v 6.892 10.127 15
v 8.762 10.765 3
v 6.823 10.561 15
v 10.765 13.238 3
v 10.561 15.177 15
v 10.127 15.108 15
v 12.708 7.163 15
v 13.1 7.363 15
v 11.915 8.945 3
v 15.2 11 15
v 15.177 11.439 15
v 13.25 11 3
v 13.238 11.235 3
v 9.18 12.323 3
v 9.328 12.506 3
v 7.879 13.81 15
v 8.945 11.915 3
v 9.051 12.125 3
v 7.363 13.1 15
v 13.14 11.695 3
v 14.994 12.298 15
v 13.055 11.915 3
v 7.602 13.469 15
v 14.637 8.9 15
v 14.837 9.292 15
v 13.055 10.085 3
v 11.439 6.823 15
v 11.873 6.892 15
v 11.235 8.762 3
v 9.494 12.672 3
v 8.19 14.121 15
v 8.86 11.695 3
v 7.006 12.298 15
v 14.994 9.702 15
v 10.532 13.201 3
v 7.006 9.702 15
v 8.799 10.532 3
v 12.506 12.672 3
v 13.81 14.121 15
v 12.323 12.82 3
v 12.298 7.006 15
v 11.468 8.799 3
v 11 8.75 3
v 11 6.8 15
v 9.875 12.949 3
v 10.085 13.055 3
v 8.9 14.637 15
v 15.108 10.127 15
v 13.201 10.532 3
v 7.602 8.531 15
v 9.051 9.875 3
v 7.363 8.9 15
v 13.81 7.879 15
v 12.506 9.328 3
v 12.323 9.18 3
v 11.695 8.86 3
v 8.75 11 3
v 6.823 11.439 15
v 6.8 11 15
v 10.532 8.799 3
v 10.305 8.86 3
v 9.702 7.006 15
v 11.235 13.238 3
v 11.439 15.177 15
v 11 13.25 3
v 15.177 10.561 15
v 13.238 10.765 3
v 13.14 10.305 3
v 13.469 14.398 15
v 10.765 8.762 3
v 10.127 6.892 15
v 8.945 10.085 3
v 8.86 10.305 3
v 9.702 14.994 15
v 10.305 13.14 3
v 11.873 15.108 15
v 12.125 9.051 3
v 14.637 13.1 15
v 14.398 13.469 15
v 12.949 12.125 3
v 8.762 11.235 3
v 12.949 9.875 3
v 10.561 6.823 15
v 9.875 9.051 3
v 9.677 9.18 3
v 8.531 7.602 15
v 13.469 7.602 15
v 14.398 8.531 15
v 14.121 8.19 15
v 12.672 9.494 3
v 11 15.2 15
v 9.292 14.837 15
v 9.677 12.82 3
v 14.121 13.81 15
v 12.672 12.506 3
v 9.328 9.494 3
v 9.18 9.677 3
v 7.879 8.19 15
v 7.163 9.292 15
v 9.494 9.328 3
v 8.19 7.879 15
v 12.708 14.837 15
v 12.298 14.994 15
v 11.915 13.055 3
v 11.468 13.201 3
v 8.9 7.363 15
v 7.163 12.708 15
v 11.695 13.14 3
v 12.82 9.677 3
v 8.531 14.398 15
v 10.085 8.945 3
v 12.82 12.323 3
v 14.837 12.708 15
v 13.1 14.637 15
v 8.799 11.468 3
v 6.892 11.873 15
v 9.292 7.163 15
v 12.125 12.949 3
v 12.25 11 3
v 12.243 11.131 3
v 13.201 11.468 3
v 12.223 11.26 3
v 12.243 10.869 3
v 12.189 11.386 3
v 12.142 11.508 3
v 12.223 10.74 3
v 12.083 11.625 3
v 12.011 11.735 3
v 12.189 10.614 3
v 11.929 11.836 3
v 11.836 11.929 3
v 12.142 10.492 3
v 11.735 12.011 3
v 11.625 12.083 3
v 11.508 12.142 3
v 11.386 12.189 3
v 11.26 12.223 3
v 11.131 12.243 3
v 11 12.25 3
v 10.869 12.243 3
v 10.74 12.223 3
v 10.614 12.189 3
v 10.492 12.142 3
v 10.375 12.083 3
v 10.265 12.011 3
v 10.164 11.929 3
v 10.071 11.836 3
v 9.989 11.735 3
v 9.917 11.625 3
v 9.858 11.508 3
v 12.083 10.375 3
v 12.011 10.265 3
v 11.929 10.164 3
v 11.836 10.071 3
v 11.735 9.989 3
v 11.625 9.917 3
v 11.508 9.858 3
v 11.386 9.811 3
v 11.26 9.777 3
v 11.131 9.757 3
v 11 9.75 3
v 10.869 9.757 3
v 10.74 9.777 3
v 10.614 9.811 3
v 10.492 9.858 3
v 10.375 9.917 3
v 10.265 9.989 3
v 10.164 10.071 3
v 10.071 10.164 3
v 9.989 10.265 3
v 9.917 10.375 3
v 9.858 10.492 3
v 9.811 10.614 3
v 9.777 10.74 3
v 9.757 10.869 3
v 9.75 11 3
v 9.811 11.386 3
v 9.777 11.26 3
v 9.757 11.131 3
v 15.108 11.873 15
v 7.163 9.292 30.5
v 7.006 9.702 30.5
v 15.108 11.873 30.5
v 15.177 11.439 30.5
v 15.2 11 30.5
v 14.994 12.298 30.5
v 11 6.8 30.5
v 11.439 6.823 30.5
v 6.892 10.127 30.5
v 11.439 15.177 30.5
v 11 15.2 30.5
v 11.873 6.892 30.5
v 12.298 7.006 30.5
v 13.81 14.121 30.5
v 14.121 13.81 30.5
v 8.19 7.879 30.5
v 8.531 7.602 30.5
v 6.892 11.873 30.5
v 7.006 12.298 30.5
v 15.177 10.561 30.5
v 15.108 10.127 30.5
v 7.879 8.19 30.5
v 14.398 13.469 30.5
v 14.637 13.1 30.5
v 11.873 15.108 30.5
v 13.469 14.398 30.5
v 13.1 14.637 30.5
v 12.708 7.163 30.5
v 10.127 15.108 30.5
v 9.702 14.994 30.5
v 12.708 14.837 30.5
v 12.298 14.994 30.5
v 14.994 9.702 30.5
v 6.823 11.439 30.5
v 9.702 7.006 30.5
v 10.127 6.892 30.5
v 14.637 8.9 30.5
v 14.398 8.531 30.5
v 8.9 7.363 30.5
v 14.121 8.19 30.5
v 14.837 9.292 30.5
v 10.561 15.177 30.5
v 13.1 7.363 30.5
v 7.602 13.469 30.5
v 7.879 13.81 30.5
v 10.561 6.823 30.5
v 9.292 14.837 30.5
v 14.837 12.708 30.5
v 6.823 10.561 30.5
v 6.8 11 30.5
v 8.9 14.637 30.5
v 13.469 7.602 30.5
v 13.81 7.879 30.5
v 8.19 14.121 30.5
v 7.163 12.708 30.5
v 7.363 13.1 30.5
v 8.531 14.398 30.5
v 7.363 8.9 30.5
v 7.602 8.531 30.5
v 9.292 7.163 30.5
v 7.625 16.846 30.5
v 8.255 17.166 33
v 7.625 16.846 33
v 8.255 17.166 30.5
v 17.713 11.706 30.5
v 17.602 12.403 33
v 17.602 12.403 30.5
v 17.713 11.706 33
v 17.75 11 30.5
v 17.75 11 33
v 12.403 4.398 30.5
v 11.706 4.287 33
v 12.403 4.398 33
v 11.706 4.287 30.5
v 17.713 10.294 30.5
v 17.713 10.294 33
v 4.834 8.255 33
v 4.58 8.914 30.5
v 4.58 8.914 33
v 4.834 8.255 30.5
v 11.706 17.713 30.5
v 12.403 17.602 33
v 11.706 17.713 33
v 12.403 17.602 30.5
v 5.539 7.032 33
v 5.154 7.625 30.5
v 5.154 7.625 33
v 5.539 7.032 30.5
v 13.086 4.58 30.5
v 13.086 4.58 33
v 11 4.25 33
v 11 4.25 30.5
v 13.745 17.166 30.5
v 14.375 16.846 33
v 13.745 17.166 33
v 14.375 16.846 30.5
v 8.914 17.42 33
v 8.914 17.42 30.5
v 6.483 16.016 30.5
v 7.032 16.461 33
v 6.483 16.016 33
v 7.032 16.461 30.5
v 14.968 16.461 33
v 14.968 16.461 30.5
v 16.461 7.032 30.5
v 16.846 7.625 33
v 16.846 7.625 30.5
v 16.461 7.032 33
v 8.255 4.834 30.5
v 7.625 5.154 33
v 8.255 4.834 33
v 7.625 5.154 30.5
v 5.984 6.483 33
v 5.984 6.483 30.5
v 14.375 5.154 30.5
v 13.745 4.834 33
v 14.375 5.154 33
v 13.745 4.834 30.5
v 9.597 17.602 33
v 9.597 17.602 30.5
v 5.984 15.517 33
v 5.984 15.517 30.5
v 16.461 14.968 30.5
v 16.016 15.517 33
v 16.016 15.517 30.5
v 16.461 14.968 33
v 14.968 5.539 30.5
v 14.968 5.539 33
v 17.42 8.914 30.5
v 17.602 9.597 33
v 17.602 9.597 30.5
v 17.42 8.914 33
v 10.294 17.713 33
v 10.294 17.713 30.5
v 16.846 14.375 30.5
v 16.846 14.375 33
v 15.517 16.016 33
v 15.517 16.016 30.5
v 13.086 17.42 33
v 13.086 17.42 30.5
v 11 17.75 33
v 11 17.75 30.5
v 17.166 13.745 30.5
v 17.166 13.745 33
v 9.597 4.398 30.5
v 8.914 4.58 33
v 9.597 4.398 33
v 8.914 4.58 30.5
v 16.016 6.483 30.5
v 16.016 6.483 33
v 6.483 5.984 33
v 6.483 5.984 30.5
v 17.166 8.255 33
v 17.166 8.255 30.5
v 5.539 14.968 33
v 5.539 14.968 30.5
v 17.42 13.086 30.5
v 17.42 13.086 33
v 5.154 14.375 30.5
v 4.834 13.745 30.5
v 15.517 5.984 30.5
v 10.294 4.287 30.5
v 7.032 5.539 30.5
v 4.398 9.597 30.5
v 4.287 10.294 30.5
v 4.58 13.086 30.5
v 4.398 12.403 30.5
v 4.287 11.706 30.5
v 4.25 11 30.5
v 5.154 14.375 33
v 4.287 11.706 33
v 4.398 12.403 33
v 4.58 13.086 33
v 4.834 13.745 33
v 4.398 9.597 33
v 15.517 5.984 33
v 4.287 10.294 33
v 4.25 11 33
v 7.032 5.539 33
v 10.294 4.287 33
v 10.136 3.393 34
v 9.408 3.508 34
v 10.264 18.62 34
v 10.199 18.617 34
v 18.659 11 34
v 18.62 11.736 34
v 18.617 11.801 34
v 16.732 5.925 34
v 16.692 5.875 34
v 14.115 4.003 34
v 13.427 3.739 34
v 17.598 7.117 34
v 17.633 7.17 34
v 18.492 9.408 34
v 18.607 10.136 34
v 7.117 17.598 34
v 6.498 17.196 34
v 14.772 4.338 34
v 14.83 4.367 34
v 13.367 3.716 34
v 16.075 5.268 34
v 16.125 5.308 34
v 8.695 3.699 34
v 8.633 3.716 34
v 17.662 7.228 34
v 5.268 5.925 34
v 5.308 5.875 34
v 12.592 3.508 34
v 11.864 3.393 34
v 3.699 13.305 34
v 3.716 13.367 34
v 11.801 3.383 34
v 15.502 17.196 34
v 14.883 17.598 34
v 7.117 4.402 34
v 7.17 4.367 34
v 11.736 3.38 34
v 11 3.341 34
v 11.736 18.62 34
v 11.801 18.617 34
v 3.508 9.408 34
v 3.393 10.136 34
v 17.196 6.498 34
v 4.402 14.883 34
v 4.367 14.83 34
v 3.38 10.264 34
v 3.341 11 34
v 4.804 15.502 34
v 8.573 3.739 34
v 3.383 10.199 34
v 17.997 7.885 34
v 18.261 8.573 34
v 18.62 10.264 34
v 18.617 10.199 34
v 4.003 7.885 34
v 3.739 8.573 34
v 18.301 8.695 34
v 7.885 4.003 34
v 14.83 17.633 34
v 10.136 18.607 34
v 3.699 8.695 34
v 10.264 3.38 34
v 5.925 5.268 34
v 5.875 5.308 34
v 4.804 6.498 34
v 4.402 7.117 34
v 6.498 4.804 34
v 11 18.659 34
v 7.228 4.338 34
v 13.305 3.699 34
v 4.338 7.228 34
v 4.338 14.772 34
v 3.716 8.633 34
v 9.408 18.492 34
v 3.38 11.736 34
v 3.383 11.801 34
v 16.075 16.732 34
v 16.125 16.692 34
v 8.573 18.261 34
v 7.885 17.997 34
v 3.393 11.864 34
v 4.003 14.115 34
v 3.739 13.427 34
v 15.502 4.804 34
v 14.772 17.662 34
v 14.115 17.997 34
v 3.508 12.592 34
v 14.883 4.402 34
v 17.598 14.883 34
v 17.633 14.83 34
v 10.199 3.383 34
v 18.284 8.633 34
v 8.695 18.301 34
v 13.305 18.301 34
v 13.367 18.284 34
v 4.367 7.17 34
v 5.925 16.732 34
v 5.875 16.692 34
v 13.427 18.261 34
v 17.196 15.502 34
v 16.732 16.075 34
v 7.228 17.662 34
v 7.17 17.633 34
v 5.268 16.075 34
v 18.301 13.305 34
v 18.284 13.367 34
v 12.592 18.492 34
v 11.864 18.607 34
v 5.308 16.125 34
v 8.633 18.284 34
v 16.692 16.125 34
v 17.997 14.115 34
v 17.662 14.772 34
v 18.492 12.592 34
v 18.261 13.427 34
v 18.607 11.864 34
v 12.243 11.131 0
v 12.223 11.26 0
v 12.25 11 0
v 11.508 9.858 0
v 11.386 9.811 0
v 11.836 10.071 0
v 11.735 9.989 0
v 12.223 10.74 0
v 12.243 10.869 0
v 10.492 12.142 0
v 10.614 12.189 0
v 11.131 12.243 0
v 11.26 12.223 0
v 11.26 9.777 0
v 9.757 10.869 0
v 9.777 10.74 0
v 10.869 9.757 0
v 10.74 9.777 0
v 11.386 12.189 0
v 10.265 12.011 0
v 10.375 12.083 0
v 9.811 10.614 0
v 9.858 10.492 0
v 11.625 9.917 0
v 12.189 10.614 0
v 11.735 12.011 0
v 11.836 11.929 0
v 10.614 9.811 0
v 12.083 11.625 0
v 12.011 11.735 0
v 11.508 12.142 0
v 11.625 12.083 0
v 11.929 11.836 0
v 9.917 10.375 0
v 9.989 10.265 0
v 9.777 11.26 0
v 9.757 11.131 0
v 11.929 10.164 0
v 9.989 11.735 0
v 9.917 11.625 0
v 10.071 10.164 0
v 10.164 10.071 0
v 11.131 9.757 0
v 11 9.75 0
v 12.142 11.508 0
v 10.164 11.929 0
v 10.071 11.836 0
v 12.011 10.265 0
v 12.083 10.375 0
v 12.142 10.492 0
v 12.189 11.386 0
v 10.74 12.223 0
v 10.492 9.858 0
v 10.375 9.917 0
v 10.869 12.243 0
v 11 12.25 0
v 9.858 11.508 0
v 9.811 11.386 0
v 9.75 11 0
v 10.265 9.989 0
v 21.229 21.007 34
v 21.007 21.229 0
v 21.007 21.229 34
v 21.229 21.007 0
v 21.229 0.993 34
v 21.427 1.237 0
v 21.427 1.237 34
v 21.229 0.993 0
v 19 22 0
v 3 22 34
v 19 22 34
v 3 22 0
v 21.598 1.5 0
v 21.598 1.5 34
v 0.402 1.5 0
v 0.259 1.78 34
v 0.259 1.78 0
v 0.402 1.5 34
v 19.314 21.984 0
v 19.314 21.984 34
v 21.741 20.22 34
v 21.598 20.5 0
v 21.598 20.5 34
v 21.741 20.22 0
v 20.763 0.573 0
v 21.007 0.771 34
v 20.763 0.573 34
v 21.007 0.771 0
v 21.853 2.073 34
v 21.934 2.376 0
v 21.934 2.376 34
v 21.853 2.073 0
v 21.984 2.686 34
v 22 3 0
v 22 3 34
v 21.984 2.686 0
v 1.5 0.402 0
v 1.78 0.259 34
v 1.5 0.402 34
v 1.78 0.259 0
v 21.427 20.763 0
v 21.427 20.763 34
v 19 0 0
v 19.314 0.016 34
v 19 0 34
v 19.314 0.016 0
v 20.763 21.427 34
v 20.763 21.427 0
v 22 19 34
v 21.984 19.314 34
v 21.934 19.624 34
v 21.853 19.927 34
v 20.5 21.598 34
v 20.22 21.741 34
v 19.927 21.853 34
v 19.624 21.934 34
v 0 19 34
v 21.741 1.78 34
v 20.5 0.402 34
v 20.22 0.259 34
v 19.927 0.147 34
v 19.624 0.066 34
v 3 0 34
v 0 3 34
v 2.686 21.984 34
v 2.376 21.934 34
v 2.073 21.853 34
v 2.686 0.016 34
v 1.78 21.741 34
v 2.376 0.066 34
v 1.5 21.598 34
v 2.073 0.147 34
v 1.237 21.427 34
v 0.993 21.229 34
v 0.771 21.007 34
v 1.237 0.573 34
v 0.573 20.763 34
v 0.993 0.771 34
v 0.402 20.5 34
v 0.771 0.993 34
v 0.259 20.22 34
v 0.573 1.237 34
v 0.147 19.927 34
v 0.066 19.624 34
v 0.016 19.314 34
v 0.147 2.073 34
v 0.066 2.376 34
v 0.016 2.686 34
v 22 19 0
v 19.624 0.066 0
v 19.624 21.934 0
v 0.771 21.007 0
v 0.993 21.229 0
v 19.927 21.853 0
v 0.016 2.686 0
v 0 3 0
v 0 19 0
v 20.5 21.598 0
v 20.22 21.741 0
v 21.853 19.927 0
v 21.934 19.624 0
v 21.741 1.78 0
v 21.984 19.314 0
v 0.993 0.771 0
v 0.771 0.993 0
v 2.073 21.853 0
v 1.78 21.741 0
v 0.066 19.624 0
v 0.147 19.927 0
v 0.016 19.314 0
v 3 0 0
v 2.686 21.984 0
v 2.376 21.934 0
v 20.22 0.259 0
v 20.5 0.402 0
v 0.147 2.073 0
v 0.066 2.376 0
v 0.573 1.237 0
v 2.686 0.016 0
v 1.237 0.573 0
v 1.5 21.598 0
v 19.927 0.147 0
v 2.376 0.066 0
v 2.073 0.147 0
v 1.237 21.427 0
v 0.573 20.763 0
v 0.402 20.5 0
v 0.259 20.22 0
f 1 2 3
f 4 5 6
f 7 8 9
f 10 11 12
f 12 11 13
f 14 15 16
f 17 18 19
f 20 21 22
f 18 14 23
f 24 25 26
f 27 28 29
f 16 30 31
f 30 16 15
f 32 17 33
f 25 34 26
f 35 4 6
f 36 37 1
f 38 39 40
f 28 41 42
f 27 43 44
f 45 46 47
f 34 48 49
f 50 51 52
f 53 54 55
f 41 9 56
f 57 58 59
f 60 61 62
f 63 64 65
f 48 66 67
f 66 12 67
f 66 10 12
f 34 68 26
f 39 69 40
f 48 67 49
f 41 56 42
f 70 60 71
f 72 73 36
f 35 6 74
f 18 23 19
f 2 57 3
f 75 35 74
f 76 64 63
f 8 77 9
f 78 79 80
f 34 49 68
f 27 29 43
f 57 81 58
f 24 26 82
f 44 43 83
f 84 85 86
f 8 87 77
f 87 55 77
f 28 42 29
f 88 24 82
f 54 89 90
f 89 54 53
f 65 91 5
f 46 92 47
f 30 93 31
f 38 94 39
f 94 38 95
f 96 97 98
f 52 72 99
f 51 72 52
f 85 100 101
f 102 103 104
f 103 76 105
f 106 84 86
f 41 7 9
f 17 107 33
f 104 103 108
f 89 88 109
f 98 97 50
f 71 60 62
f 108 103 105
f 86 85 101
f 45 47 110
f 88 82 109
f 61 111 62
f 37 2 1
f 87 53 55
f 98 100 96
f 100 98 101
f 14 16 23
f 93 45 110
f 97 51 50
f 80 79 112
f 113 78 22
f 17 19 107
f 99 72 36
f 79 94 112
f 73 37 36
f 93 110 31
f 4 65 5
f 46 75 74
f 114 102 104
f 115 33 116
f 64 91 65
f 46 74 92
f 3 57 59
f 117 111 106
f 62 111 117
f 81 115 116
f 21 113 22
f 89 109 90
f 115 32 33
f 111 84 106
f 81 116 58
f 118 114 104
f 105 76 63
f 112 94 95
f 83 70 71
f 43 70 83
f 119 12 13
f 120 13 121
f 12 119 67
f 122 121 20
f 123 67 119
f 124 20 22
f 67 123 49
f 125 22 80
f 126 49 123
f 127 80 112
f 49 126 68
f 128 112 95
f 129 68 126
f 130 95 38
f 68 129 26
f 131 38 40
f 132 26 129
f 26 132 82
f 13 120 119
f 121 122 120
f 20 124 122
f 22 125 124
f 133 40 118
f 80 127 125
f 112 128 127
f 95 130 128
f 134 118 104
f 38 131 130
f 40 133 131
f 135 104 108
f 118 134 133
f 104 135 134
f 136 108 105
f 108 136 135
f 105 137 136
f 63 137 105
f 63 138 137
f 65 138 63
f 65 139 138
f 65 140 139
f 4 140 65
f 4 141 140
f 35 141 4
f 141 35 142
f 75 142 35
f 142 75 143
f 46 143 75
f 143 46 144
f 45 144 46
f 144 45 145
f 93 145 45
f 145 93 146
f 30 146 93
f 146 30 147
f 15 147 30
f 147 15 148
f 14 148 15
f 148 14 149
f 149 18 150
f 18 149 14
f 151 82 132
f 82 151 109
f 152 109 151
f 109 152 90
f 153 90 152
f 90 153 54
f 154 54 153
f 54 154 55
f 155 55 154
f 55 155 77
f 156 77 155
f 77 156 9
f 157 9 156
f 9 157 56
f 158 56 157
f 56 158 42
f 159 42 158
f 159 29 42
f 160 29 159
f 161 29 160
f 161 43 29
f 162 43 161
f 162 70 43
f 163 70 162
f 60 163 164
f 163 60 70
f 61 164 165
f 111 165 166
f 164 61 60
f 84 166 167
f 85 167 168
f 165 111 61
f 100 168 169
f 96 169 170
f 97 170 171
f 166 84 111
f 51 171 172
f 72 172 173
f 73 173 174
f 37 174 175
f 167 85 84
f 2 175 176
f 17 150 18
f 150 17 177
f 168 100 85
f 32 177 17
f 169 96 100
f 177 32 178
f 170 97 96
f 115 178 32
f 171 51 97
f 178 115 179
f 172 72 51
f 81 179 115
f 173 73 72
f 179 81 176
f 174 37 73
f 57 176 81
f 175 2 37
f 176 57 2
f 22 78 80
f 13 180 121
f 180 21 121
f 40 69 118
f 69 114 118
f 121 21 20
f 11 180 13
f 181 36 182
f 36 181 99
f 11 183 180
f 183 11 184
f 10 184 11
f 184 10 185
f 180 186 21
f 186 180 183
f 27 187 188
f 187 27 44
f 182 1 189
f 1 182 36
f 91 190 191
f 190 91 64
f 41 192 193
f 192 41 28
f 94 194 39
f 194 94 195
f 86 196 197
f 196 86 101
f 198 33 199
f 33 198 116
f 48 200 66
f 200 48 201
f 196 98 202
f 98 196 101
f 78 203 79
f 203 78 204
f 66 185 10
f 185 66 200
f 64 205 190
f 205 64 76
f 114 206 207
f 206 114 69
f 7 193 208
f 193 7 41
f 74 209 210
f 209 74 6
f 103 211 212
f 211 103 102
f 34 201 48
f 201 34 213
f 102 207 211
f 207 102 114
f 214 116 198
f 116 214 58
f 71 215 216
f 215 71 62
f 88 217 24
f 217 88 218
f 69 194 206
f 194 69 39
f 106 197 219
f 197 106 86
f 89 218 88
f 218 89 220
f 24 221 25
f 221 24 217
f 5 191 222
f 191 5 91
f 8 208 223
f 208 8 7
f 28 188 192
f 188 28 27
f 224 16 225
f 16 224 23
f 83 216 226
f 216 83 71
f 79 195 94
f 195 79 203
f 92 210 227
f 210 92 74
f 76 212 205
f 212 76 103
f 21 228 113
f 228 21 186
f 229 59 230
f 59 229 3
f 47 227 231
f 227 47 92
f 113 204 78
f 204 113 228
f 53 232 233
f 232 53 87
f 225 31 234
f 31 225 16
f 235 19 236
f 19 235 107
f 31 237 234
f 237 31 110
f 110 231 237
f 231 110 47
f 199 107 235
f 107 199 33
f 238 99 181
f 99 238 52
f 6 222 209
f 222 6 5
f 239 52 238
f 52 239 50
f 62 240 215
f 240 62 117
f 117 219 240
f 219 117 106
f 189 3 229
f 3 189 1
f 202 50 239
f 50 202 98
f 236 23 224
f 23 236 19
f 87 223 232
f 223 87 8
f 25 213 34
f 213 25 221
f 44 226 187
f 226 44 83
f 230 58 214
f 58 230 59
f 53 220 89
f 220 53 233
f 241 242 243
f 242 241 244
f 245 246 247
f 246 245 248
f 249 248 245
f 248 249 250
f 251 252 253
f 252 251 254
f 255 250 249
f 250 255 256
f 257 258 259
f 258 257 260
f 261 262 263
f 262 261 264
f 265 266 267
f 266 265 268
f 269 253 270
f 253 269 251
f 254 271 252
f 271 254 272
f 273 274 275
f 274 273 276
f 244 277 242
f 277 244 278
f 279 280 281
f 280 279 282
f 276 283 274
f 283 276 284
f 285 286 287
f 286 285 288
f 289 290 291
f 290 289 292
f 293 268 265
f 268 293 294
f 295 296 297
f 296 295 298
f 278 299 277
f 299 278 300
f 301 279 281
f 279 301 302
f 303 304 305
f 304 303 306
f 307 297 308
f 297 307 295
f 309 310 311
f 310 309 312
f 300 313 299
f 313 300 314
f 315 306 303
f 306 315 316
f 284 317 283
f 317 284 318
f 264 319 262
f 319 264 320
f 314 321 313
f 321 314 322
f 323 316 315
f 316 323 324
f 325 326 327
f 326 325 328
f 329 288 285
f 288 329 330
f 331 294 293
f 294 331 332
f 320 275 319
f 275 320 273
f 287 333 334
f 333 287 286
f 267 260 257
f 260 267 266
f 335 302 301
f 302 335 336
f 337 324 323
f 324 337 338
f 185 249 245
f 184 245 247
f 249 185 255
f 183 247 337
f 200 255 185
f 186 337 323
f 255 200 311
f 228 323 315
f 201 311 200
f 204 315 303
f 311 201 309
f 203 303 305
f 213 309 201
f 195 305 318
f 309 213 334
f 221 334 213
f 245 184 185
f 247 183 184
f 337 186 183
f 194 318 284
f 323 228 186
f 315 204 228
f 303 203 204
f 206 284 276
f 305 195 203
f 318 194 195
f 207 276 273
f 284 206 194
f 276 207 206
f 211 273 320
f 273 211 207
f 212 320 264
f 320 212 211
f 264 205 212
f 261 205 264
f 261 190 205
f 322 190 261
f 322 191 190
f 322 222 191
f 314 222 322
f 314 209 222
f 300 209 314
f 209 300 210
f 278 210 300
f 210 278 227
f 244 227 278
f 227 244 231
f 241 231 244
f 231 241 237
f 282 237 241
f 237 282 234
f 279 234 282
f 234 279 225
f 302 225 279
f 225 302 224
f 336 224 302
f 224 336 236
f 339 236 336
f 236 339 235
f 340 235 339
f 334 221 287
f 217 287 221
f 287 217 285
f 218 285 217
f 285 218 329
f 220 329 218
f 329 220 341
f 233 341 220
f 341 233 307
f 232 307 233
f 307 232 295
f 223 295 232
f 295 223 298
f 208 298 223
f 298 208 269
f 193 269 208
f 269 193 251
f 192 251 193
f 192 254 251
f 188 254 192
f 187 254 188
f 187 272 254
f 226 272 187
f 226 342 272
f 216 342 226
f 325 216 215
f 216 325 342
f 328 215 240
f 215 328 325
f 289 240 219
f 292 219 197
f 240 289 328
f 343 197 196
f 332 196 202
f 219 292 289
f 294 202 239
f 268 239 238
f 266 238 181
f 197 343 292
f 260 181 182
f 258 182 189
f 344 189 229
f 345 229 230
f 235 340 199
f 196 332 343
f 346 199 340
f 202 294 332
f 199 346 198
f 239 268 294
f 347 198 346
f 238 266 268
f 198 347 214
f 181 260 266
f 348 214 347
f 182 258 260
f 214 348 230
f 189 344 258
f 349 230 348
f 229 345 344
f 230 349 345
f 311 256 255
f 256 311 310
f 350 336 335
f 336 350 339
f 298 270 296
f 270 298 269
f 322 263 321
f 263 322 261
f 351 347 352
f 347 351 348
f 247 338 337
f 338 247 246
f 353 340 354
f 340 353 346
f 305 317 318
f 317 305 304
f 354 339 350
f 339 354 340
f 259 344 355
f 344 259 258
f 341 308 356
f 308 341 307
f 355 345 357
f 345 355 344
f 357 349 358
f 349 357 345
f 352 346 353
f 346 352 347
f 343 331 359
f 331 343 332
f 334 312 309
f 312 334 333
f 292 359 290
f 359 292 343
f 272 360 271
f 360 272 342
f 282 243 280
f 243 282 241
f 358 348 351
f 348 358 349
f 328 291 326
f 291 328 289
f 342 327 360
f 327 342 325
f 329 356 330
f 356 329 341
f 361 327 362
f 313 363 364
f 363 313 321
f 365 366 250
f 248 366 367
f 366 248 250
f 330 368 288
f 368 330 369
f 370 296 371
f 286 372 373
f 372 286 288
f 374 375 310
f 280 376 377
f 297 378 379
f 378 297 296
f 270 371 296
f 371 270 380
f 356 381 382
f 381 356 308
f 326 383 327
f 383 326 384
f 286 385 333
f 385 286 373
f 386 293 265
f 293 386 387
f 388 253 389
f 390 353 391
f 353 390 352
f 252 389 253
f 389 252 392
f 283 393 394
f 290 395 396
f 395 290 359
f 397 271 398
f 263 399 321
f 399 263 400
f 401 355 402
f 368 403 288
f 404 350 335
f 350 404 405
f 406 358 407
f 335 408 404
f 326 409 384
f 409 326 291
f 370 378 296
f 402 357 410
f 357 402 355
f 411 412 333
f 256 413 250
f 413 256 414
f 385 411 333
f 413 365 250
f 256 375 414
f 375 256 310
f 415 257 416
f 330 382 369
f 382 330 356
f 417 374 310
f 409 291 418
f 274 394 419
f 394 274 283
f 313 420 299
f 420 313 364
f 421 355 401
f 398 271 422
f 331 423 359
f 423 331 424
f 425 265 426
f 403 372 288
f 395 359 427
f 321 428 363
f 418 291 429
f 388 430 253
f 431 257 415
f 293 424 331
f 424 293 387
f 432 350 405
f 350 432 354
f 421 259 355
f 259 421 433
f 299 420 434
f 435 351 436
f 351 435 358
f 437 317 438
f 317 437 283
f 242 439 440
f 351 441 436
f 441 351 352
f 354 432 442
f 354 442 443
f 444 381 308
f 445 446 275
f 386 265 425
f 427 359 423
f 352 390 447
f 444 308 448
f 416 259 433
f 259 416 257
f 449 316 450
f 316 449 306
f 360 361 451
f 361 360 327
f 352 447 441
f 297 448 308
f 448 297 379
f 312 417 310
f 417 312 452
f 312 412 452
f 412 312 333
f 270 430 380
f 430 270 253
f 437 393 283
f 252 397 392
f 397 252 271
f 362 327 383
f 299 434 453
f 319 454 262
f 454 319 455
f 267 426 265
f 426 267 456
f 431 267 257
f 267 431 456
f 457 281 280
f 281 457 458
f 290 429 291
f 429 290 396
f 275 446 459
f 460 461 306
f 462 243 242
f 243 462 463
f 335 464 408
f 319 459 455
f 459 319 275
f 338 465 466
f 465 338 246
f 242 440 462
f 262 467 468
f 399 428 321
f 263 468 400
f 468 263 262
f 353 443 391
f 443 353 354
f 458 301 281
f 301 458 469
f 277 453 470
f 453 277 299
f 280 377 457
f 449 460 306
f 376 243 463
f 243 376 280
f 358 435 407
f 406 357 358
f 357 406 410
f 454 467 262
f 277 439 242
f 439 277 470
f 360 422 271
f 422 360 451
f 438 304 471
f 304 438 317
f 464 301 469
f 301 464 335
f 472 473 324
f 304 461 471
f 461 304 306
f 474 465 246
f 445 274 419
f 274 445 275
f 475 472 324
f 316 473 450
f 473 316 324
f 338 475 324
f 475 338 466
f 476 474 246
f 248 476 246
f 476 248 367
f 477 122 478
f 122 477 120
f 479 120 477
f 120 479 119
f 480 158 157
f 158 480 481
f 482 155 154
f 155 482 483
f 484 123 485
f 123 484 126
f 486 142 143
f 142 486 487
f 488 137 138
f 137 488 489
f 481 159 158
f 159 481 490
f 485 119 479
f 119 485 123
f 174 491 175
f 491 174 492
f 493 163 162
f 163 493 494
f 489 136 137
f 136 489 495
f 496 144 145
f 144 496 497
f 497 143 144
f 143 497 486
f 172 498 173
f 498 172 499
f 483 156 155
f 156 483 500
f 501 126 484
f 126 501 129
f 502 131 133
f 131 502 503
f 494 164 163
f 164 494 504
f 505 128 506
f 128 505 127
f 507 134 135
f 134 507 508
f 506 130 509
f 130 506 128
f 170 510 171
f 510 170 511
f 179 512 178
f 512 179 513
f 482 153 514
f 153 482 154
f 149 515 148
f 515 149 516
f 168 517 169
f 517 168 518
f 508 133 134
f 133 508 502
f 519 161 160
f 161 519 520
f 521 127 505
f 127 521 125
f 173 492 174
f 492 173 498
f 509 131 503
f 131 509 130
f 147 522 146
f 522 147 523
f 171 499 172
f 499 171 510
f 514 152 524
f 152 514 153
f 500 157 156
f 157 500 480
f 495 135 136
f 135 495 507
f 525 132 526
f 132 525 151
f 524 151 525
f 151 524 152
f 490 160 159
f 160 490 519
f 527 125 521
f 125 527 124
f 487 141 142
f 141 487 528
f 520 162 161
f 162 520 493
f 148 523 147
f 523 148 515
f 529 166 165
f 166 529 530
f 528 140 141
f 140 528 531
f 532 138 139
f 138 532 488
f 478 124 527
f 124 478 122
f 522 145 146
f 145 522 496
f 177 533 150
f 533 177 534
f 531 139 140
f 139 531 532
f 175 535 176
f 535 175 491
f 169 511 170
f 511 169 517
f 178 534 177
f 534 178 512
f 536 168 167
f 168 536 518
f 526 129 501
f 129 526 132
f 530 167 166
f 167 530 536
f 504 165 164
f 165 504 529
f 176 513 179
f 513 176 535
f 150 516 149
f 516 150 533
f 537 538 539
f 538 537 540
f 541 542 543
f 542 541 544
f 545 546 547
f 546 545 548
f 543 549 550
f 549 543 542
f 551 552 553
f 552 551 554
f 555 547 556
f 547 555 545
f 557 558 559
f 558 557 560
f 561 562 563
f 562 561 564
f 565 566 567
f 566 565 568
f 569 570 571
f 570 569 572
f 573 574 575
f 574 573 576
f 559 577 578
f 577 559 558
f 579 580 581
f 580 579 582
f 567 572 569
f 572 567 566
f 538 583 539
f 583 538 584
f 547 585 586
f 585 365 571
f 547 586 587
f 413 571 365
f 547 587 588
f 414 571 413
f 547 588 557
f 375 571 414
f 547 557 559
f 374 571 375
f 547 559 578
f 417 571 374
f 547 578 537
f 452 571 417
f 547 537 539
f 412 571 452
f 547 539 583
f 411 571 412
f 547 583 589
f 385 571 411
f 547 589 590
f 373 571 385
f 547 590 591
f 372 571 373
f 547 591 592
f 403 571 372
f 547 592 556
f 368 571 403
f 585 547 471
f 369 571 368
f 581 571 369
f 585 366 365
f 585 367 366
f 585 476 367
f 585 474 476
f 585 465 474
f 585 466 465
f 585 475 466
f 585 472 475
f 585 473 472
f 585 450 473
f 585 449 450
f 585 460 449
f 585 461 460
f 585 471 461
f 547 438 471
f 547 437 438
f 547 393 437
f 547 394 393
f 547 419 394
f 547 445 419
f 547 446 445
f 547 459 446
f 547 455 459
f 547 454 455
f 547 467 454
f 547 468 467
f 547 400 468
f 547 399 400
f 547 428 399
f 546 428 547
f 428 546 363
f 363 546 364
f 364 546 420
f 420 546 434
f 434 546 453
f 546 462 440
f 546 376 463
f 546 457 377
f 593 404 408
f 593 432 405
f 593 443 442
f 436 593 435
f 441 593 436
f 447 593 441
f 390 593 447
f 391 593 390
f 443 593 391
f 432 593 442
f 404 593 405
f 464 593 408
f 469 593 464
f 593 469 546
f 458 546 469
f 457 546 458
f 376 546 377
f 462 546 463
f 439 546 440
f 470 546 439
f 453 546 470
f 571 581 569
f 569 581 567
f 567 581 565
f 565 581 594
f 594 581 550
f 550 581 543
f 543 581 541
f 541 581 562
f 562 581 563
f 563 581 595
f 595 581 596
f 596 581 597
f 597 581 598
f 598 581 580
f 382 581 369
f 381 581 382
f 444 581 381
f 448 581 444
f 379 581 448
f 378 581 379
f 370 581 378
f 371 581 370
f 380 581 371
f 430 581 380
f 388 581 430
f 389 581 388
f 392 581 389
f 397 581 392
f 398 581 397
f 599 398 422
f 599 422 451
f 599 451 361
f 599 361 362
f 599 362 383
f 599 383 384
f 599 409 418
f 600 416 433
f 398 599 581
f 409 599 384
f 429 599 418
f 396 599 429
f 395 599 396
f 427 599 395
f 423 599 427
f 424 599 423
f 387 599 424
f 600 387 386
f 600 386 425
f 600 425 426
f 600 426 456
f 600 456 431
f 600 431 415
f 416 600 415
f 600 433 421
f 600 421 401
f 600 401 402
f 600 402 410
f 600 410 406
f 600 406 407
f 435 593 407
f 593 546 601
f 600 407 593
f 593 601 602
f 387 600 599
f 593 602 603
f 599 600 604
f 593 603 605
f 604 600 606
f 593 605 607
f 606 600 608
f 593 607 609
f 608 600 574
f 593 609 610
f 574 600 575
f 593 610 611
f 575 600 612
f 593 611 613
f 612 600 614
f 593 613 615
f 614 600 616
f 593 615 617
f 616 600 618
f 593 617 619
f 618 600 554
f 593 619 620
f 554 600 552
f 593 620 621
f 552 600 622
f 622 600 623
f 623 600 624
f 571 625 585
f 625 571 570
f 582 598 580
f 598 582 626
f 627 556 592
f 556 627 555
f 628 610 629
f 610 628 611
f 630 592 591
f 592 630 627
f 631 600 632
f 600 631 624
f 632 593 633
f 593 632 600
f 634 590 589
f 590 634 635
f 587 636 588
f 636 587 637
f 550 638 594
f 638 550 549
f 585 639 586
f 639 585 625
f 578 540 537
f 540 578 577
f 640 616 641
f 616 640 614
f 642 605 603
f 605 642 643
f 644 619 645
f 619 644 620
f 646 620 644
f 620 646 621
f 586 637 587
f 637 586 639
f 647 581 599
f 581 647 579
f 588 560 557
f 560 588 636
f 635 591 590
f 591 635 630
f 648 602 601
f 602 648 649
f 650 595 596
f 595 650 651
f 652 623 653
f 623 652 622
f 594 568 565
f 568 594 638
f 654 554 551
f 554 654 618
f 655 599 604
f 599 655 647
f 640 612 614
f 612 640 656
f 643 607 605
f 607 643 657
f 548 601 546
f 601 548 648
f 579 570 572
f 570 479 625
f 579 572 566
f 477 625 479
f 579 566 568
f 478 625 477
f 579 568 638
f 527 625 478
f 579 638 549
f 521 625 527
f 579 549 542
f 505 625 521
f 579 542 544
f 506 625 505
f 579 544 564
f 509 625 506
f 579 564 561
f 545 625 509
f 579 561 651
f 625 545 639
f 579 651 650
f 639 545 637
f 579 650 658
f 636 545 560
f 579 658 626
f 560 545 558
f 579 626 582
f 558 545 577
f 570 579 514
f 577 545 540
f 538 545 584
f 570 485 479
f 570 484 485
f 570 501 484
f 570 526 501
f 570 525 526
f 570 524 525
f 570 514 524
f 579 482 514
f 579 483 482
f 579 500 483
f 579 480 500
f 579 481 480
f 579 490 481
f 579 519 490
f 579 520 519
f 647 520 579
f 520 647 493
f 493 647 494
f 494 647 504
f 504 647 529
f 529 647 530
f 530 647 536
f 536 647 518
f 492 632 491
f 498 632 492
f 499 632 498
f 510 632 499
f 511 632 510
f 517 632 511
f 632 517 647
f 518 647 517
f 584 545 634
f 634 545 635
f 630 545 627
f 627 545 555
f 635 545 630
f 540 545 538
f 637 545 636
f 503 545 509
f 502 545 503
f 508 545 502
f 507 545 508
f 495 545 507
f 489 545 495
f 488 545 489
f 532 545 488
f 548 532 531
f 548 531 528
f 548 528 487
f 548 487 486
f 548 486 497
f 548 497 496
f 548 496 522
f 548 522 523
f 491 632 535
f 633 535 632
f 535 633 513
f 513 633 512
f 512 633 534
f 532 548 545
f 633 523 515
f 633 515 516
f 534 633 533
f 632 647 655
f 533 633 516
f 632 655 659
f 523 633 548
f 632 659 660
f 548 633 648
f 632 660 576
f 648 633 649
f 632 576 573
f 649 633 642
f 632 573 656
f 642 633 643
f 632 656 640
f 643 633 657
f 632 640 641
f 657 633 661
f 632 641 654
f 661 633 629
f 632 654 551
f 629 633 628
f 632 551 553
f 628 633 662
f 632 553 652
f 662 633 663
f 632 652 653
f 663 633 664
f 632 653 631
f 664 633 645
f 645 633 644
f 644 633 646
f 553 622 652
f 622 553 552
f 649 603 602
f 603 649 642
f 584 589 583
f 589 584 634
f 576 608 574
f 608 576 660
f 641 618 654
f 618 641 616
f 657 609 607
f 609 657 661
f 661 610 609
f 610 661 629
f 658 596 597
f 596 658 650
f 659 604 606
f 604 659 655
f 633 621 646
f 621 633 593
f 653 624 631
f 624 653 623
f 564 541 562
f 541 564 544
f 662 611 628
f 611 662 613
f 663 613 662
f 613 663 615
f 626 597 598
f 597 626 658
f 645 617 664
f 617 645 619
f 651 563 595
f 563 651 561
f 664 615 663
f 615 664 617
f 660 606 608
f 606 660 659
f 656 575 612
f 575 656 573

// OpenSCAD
/* =========================================================
   Caja / Soporte Individual para Microtubo de 0.5 mL
   (Solo Base)
   ========================================================= */

$fn = 60; // Suavizado de curvas

// --- Dimensiones del microtubo (con holgura para inserción) ---
tube_body_dia    = 8.4;   // Diámetro del cuerpo cilíndrico superior (mm)
cone_tip_dia     = 4.5;   // Diámetro en la base del cono inferior (mm)
cone_height      = 12.0;  // Altura de la sección cónica (mm)
cylinder_height  = 16.0;  // Altura del cuerpo recto superior (mm)

rim_dia          = 13.5;  // Diámetro para el borde superior y la bisagra (mm)
rim_depth        = 3.5;   // Profundidad para alojar el borde a ras (mm)

// --- Dimensiones de la caja exterior ---
base_size        = 22.0;  // Ancho y largo exterior (mm)
base_height      = 34.0;  // Altura total del bloque (mm)
corner_radius    = 3.0;   // Radio de redondeo de las esquinas exteriores (mm)

// --- Renderizado de la base ---
caja_base_solo();

// ==================== MÓDULOS ====================

module caja_base_solo() {
    difference() {
        // Bloque exterior sólido con esquinas redondeadas
        rounded_cube([base_size, base_size, base_height], corner_radius);

        // Cavidad interior para el microtubo (centrada)
        translate([base_size / 2, base_size / 2, 0]) {
            // Fondo cónico (inicia a 3 mm del suelo)
            translate([0, 0, 3.0])
                cylinder(h = cone_height, d1 = cone_tip_dia, d2 = tube_body_dia);

            // Cilindro central
            translate([0, 0, 3.0 + cone_height])
                cylinder(h = cylinder_height + 0.1, d = tube_body_dia);

            // Rebaje para el borde superior y la pestaña
            translate([0, 0, base_height - rim_depth])
                cylinder(h = rim_depth + 1, d = rim_dia);

            // Chamfer/chaflán en la entrada para insertar fácilmente
            translate([0, 0, base_height - 1.0])
                cylinder(h = 1.1, d1 = rim_dia, d2 = rim_dia + 2.0);

            // Orificio inferior pasante (desagüe y expulsión si se traba)
            translate([0, 0, -1])
                cylinder(h = 5, d = 2.5);
        }
    }
}

// Función auxiliar para esquinas redondeadas
module rounded_cube(size, r) {
    x = size[0];
    y = size[1];
    z = size[2];
    hull() {
        translate([r, r, 0])         cylinder(h = z, r = r);
        translate([x - r, r, 0])     cylinder(h = z, r = r);
        translate([r, y - r, 0])     cylinder(h = z, r = r);
        translate([x - r, y - r, 0]) cylinder(h = z, r = r);
    }
}
